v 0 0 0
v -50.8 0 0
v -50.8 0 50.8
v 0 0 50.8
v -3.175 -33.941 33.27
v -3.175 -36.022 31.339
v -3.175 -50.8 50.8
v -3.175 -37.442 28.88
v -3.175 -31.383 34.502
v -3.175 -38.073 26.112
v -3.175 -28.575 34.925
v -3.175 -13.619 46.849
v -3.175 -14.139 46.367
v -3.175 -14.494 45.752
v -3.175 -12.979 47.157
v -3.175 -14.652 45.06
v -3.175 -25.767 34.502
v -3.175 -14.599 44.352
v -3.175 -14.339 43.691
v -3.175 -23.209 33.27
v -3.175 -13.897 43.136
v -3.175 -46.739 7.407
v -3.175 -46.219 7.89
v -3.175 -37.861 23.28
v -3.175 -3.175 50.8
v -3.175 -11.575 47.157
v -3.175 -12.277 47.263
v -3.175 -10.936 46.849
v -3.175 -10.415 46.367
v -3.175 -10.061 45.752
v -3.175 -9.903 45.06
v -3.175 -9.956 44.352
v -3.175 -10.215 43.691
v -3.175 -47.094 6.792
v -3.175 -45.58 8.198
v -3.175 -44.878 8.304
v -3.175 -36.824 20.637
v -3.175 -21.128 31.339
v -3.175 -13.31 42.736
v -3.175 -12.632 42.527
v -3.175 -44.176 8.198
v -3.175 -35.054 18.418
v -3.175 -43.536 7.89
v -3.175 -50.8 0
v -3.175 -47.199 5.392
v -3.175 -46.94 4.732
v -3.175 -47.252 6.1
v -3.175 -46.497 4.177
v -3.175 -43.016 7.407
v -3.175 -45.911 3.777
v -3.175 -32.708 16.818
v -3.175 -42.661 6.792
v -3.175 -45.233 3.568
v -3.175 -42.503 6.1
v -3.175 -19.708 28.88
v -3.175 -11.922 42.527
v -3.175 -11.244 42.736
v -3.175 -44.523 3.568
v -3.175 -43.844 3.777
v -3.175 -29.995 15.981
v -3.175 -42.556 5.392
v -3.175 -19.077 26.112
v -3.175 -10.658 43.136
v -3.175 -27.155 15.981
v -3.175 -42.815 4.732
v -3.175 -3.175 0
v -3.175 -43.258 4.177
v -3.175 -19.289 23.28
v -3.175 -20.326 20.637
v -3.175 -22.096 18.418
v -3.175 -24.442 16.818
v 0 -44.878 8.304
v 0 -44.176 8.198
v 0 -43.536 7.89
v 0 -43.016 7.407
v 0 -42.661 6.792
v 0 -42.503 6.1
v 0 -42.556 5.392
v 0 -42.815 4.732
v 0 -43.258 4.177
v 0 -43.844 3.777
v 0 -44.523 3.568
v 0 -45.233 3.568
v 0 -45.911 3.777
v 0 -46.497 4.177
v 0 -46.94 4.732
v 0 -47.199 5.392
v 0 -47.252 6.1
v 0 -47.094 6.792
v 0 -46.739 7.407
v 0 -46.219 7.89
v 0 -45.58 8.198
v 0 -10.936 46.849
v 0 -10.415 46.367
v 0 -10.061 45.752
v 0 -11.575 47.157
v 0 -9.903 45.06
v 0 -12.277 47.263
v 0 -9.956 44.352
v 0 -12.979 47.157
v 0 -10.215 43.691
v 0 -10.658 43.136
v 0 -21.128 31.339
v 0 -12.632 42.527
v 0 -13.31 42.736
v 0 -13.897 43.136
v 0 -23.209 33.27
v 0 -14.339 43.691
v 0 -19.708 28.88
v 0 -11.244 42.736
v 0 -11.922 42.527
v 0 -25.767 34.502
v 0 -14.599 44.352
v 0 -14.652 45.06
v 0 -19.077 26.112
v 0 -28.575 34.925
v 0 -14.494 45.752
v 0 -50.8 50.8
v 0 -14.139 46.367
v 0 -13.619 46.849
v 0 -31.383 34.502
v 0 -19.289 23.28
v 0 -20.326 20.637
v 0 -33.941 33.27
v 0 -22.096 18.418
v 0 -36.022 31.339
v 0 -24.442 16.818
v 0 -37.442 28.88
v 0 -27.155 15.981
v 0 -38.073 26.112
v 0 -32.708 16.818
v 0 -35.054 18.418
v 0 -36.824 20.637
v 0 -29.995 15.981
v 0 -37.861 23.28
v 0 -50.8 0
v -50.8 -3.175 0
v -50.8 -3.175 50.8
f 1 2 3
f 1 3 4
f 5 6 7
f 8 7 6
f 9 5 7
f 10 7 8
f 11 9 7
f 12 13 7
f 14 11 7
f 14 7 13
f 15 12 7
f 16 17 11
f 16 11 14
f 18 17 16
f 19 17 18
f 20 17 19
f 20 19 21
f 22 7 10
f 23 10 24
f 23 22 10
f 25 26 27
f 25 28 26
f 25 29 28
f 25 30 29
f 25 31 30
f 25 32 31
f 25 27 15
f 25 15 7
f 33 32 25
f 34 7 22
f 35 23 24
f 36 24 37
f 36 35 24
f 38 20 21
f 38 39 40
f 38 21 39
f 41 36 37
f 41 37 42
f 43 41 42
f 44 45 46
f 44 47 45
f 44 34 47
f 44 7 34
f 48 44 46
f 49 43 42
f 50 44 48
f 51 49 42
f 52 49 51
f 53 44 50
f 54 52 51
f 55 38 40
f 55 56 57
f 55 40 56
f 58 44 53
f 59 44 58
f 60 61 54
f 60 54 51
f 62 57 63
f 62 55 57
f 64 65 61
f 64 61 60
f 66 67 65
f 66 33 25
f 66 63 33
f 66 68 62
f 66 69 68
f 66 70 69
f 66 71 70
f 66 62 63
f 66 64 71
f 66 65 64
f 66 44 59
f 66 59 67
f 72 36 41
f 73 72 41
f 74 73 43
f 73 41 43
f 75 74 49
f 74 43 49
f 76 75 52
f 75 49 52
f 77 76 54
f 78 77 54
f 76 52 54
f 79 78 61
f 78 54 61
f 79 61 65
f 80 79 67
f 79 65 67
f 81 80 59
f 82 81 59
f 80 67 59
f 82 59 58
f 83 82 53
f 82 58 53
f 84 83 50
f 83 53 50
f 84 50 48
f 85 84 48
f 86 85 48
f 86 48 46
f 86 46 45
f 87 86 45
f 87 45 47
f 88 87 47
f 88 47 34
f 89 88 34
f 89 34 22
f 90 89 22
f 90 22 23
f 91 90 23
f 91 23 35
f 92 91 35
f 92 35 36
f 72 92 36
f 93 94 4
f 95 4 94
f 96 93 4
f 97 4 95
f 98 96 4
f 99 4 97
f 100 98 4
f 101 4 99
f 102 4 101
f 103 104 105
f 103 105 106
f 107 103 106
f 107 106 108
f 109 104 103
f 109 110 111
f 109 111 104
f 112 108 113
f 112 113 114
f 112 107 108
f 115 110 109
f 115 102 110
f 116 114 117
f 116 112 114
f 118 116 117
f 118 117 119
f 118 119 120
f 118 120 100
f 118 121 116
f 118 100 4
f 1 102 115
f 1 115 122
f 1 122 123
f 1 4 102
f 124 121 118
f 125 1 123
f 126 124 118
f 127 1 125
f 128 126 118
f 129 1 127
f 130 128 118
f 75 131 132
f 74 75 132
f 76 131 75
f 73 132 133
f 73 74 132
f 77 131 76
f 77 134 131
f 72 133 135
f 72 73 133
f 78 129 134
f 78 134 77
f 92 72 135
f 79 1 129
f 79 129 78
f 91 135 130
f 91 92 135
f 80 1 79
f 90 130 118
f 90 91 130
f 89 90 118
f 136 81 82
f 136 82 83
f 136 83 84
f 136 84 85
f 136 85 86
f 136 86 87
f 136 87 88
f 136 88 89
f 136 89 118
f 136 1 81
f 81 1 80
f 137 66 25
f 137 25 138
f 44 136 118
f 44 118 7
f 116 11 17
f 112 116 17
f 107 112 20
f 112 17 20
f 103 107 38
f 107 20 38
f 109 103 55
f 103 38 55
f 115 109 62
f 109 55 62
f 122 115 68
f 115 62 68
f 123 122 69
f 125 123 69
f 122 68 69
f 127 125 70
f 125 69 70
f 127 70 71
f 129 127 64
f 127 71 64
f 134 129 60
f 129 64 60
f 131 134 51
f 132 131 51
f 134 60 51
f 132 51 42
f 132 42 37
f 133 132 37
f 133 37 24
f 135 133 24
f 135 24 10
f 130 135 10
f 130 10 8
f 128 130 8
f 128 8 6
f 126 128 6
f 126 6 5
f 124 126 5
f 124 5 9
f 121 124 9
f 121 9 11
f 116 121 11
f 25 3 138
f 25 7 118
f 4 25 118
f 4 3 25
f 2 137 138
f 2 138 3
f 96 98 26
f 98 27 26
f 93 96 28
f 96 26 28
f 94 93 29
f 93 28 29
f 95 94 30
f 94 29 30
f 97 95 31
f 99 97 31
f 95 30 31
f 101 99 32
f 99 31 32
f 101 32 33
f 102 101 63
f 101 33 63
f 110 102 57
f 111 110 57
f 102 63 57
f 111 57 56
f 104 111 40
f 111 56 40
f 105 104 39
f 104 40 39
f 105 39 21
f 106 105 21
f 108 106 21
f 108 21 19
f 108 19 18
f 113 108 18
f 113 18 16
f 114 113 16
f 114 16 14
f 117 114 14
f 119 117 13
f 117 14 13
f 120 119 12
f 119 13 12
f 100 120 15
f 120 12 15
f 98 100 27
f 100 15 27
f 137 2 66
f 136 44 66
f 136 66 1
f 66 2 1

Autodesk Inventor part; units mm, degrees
ref_plane "YZ Plane" through (0, 0, 0) normal (1, 0, 0) x (0, 1, 0)
ref_plane "XZ Plane" through (0, 0, 0) normal (0, 1, 0) x (-1, 0, 0)
ref_plane "XY Plane" through (0, 0, 0) normal (0, 0, 1) x (1, 0, 0)
sketch "Sketch1" plane through (0, 0, 0) normal (0, 0, 1) x (1, 0, 0)
  line L0 (0, 0) -> (0, -50.8)
  line L1 (0, -50.8) -> (-3.175, -50.8)
  line L2 (-3.175, -50.8) -> (-3.175, -3.175)
  line L3 (-3.175, -3.175) -> (-50.8, -3.175)
  line L4 (-50.8, -3.175) -> (-50.8, 0)
  line L5 (-50.8, 0) -> (0, 0)
  dimension "d0" = 50.8
  dimension "d1" = 3.175
  dimension "d2" = 47.625
  dimension "d3" = 47.625
extrude "Extrusion1" add sketch "Sketch1" along normal blind 50.8
sketch "Sketch2" plane through (-3.175, -50.8, 0) normal (-1, 0, 0) x (0, 0, 1)
  circle A0 centre (25.4, 22.225) radius 9.525
  line L0 (0, 50.8) -> (0, 0) projected
  line L1 (0, 0) -> (50.8, 0) projected
  circle A1 centre (25.4, 22.225) radius 25.4 construction
  circle A2 centre (44.8818, 38.5228) radius 2.3813
  circle A3 centre (5.9223, 5.9223) radius 2.3813
  line L2 (5.9223, 5.9223) -> (5.9223, 50.8) construction
  line L3 (0, 50.8) -> (50.8, 50.8) construction
  line L4 (5.9223, 5.9223) -> (0, 5.9223) construction
  line L5 (5.9223, 5.9223) -> (5.9223, 0) construction
  line L6 (50.8, 0) -> (50.8, 50.8) construction
  dimension "d9" = 25.4
  dimension "d10" = 22.225
  dimension "d13" = 50.8
  dimension "d14" = 4.7625
  dimension "d15" = 4.7625
  dimension "d16" = 5.9182
  dimension "d17" = 19.05
extrude "Extrusion2" cut sketch "Sketch2" against normal blind 3.175
properties part number "bag motor bracket"
